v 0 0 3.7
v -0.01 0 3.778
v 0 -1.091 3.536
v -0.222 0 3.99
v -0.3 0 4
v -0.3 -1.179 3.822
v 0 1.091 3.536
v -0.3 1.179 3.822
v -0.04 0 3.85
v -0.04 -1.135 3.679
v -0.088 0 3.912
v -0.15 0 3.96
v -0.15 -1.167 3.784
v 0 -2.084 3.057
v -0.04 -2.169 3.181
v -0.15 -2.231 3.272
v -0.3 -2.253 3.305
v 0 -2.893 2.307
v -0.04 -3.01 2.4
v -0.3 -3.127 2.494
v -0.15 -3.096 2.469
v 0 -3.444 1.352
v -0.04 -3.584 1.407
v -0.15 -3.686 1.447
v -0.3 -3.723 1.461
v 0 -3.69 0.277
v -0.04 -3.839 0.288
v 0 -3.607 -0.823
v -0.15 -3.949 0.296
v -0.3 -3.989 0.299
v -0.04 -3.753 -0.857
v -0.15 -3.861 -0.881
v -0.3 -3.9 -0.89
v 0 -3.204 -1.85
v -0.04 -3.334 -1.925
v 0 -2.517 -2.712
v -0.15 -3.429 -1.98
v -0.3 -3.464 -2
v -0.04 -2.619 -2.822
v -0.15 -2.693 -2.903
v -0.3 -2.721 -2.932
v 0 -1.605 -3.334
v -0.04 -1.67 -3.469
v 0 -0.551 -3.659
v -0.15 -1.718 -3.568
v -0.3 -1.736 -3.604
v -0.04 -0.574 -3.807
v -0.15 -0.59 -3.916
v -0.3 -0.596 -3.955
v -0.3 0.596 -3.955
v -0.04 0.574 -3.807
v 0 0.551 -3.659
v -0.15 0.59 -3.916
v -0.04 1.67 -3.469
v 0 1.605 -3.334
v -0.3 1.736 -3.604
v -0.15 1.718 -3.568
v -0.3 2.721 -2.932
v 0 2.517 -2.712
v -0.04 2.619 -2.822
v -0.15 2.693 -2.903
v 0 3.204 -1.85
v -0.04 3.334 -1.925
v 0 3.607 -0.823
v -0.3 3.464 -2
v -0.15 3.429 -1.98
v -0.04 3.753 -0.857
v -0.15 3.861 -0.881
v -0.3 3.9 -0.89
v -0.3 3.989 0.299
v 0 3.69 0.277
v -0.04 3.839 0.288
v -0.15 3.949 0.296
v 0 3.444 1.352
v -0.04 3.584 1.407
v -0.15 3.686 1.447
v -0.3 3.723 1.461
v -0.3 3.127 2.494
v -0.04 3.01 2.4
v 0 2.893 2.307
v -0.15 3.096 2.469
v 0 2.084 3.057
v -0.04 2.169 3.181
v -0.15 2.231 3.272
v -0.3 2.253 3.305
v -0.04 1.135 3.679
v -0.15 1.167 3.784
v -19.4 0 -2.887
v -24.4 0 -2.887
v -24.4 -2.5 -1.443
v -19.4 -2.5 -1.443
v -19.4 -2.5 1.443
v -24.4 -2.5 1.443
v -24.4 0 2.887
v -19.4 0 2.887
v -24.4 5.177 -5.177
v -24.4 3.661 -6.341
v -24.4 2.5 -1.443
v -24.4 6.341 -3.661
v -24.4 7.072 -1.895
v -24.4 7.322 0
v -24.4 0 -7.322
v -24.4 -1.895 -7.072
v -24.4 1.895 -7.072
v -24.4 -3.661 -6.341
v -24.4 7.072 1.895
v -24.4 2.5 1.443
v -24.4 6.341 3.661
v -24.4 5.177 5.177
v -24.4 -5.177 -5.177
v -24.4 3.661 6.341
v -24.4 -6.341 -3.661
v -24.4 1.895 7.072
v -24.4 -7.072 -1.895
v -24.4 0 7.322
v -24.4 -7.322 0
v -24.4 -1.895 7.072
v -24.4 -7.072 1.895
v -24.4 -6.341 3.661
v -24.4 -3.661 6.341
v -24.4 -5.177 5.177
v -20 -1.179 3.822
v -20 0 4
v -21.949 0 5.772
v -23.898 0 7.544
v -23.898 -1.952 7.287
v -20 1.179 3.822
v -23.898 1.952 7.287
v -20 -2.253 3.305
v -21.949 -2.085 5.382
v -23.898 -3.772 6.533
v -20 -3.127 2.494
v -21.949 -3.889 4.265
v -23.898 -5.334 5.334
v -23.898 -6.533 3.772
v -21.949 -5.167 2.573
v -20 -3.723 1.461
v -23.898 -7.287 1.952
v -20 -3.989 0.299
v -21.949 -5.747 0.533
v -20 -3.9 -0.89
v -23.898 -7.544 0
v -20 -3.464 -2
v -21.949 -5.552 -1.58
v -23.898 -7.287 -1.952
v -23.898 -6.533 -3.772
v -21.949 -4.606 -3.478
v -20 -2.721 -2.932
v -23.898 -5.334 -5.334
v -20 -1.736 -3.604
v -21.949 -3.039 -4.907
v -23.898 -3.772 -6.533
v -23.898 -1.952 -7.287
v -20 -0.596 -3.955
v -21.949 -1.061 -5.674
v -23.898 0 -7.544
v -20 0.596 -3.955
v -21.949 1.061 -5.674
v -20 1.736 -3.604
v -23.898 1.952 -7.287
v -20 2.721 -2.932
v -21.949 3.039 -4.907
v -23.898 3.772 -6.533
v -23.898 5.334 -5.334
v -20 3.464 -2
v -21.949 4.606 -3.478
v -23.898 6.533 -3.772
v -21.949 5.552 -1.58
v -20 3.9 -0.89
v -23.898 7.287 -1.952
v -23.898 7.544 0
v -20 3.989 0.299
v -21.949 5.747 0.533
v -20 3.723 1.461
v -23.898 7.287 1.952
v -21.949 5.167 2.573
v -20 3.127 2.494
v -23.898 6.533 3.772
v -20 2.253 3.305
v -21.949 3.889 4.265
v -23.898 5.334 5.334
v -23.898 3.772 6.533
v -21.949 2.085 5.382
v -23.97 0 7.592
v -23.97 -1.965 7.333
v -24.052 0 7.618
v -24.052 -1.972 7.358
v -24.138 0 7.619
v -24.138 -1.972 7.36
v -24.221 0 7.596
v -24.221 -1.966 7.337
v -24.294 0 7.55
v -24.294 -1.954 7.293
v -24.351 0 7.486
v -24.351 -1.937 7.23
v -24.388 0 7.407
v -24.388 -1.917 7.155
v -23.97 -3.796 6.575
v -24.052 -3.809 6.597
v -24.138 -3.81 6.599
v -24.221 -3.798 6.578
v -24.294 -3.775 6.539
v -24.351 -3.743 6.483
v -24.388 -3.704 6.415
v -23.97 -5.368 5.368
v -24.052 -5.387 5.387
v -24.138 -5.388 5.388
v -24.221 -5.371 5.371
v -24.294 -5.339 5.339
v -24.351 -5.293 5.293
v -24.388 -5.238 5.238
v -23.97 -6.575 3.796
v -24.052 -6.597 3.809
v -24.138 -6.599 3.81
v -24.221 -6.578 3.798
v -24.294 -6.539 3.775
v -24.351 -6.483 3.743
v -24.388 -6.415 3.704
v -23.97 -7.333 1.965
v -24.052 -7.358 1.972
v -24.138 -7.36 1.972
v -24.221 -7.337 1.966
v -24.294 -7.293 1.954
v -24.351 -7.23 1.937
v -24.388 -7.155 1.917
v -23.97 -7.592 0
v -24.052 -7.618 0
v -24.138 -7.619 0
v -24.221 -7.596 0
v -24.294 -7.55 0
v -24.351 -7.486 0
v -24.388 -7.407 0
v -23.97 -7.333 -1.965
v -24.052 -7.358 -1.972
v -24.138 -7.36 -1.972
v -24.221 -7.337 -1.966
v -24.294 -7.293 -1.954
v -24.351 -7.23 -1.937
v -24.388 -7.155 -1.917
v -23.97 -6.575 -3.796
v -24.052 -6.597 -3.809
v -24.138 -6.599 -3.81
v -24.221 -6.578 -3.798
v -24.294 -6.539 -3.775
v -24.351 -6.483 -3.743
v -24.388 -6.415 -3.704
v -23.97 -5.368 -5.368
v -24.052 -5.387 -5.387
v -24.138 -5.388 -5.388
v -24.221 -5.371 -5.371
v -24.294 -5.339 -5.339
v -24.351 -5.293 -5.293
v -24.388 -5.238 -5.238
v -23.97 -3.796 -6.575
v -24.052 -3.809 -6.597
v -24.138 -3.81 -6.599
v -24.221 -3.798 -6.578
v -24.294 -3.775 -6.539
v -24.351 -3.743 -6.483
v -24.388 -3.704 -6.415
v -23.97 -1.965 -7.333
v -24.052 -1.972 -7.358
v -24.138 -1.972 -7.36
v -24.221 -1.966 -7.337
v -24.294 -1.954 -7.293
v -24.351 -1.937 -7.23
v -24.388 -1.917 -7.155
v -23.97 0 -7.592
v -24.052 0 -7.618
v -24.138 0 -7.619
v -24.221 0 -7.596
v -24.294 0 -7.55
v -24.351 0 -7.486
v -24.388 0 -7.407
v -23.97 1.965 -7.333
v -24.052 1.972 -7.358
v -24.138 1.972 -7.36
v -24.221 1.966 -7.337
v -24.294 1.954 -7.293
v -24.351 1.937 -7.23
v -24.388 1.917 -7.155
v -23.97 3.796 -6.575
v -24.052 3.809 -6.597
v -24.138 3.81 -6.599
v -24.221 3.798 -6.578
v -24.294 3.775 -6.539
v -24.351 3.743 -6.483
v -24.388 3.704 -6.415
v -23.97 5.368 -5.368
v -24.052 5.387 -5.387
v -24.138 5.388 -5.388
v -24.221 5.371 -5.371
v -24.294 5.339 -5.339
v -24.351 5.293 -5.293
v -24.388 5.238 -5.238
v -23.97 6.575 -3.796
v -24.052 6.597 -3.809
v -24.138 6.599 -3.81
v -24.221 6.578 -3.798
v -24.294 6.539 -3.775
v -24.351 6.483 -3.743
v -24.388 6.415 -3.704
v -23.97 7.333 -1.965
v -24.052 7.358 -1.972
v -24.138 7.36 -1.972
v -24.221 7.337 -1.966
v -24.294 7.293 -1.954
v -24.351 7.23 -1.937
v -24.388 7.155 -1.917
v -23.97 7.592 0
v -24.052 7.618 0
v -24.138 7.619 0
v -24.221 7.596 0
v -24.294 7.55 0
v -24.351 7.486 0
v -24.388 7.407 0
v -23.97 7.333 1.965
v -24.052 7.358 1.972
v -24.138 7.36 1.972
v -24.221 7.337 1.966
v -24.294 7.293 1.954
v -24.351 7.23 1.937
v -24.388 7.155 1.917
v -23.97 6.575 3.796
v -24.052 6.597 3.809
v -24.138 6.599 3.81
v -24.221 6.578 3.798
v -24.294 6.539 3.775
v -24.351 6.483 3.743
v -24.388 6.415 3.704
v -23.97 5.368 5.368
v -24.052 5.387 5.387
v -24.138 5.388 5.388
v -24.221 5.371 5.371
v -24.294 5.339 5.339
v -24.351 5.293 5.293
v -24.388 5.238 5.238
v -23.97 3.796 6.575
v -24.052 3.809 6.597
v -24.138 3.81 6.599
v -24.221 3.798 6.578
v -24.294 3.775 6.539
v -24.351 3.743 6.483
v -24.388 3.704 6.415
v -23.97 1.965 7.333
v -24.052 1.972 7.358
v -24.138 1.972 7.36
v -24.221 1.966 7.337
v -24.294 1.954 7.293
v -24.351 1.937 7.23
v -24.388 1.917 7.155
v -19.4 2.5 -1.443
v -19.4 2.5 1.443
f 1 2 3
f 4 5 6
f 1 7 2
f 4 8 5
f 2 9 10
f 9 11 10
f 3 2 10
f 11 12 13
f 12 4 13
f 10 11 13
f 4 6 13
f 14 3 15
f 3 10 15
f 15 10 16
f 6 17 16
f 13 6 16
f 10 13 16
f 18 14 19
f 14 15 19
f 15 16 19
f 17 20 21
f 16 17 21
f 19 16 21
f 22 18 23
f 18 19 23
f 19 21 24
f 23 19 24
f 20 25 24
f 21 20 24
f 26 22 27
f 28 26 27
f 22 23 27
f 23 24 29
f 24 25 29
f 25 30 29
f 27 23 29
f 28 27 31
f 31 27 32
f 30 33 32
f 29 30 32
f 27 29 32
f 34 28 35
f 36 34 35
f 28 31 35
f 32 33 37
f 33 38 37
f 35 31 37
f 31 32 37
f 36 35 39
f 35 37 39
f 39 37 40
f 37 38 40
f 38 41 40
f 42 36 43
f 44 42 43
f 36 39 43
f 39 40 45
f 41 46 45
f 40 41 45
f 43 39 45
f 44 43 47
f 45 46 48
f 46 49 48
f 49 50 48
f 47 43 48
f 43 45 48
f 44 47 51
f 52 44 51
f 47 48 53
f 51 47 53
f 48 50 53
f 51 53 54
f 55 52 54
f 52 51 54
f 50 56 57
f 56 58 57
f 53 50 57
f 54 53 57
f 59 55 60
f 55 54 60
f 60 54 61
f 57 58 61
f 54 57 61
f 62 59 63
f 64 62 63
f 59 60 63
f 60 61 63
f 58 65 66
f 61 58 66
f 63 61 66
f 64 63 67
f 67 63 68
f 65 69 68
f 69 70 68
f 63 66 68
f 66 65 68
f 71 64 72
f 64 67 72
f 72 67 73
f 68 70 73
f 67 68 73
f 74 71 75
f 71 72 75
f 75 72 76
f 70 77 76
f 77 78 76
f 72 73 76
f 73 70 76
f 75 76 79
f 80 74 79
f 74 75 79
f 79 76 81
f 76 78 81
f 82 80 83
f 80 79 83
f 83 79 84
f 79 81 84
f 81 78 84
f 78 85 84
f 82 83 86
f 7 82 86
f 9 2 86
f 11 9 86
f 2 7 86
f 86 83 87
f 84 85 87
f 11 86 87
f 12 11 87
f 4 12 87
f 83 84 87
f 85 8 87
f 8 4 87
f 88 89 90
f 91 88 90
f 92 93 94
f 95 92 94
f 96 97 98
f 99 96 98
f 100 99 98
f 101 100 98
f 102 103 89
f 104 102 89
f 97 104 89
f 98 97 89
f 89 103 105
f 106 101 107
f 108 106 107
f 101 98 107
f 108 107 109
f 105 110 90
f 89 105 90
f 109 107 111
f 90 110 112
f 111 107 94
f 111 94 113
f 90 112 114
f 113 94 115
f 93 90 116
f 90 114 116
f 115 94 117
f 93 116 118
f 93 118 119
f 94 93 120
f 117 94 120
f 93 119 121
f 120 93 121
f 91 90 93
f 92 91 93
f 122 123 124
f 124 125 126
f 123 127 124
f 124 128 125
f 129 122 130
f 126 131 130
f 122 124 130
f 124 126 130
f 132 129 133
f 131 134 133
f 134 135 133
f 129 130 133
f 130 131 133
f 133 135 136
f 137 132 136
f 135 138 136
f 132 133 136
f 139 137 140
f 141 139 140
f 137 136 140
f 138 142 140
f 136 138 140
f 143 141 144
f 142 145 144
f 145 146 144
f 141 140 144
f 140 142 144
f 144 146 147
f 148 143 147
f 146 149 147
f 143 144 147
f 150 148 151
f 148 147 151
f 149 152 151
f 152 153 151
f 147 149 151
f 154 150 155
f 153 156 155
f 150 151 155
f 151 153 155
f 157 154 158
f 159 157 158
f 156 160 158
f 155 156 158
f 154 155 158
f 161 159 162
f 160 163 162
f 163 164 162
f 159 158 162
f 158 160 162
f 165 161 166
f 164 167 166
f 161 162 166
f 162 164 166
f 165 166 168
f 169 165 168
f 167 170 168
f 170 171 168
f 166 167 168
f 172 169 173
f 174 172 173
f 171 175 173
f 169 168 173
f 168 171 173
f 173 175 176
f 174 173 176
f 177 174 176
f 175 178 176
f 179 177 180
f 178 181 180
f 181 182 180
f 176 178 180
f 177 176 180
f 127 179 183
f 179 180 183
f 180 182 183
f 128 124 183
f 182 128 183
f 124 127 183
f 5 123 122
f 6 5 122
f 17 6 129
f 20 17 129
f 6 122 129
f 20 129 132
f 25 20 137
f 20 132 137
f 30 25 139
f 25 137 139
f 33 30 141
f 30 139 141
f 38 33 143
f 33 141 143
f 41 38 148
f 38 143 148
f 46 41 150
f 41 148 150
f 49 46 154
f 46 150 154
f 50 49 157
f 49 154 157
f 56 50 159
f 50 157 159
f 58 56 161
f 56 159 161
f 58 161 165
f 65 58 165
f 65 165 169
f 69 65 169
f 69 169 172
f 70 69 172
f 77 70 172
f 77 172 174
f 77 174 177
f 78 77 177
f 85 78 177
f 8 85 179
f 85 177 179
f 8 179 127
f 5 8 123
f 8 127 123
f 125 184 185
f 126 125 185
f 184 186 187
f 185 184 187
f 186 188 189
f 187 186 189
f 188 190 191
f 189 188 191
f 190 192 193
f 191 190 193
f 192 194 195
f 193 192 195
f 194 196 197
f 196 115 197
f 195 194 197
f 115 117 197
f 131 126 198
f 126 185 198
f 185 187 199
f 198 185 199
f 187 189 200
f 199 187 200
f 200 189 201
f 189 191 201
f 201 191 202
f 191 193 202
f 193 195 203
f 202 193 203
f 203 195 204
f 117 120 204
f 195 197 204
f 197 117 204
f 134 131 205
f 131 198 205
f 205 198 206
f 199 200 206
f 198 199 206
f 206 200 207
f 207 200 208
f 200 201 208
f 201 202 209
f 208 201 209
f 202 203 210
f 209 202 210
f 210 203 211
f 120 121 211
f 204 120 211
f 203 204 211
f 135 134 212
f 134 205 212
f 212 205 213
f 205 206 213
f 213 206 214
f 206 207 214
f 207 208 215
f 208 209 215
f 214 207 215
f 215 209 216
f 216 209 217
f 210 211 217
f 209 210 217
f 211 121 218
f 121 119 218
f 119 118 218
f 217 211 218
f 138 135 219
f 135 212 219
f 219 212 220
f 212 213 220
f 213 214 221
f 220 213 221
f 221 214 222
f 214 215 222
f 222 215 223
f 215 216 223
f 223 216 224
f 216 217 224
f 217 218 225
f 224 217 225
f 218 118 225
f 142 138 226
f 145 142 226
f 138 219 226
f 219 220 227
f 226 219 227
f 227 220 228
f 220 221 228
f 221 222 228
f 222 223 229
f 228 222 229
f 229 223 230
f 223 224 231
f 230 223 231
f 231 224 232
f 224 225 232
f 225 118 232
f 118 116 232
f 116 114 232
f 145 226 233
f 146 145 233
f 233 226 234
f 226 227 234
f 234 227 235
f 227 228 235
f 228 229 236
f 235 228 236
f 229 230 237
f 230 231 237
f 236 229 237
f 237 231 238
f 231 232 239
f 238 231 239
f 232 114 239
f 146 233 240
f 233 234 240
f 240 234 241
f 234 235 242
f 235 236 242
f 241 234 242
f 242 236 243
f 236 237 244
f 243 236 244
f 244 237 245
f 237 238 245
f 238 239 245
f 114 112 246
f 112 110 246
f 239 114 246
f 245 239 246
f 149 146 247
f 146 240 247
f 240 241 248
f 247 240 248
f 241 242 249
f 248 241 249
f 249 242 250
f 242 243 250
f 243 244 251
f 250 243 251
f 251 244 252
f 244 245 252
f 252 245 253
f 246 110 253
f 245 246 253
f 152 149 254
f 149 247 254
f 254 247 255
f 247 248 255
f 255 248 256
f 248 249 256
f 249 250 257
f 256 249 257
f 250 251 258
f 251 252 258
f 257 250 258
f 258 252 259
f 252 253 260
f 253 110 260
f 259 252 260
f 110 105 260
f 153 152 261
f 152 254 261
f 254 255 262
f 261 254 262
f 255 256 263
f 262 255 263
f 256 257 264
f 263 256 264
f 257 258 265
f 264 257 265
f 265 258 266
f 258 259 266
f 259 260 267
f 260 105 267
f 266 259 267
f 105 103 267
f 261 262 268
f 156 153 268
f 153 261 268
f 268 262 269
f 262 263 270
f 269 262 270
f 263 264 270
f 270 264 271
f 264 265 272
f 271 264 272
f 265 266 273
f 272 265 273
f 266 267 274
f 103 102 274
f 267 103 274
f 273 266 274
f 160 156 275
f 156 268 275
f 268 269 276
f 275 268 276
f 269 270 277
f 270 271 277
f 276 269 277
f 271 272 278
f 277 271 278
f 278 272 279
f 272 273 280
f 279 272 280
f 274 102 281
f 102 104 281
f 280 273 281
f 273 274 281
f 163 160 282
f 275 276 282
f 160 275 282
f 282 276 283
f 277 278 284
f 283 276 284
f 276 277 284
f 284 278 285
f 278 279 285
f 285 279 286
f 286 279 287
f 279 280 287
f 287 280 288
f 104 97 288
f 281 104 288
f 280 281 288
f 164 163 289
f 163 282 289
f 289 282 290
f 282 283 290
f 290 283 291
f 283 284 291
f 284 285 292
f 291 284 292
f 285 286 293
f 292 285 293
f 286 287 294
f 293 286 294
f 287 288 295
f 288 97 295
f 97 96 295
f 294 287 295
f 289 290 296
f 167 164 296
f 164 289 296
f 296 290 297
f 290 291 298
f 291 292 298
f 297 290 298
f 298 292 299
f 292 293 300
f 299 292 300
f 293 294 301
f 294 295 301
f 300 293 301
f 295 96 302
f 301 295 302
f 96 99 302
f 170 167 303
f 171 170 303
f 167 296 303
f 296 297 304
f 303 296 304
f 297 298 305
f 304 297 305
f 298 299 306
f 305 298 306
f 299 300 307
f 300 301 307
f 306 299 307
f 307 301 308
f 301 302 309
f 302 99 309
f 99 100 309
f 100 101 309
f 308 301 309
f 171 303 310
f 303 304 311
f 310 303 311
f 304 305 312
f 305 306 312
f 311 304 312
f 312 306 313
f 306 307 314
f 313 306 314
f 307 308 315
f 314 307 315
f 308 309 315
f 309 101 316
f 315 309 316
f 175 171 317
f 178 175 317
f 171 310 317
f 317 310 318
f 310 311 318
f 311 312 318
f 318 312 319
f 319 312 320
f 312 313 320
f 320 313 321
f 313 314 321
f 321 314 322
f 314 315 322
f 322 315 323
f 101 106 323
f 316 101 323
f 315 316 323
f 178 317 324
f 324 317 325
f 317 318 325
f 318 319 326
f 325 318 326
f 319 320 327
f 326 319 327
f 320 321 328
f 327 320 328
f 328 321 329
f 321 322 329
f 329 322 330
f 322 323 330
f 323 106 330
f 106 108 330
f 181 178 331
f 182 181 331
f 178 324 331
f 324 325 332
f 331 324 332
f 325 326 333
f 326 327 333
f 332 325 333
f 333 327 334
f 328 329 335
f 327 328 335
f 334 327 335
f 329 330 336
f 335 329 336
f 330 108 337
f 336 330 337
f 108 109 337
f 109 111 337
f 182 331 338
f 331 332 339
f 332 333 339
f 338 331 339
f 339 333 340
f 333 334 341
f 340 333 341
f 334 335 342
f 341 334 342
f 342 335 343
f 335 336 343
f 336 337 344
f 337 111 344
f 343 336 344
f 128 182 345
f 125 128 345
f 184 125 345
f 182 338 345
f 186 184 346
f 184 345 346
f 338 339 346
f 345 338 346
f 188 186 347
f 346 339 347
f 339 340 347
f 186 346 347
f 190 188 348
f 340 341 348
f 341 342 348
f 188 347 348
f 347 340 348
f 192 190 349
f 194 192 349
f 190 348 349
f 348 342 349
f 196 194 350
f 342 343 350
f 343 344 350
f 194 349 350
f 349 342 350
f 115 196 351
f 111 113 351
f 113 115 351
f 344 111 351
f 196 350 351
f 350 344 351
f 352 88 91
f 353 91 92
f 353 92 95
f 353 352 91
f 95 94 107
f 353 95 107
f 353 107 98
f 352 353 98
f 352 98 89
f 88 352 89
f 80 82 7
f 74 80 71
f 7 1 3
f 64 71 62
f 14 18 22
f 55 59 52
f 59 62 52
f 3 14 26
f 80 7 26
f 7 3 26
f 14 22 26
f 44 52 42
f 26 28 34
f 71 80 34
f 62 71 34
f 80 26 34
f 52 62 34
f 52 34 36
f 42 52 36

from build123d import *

# Parameters (mm, degrees)
KES_EKSTR_ZYON1_DEPTH = 5
RADYUS2_R             = 0.3


with BuildPart() as part:
    # Çizim1 → Döndür1 (revolve)
    with BuildSketch(Plane.XY, mode=Mode.PRIVATE) as d_nd_r1_sk:
        Polygon((0, 0), (0, 4), (-20, 4), (-24.4, 8), (-24.4, 0), align=None)
    revolve(d_nd_r1_sk.sketch.rotate(Axis((-24.4, 0, 0), (1, 0, 0)), 90), axis=Axis((-24.4, 0, 0), (1, 0, 0)))

    # Çizim2 → Kes-Ekstrüzyon1 (cut)
    with BuildSketch(Plane.ZY.offset(24.4)):
        Polygon((2.886751346, 0), (1.443375673, 2.5), (-1.443375673, 2.5), (-2.886751346, 0), (-1.443375673, -2.5), (1.443375673, -2.5), align=None)
    extrude(amount=-KES_EKSTR_ZYON1_DEPTH, mode=Mode.SUBTRACT)

    # Radyus2
    radyus2_edges = [part.edges().sort_by_distance(p)[0] for p in [
        (-24.4, 0, -8),
        (0, 0, -4),
    ]]
    fillet(radyus2_edges, radius=RADYUS2_R)


solid = part.part
